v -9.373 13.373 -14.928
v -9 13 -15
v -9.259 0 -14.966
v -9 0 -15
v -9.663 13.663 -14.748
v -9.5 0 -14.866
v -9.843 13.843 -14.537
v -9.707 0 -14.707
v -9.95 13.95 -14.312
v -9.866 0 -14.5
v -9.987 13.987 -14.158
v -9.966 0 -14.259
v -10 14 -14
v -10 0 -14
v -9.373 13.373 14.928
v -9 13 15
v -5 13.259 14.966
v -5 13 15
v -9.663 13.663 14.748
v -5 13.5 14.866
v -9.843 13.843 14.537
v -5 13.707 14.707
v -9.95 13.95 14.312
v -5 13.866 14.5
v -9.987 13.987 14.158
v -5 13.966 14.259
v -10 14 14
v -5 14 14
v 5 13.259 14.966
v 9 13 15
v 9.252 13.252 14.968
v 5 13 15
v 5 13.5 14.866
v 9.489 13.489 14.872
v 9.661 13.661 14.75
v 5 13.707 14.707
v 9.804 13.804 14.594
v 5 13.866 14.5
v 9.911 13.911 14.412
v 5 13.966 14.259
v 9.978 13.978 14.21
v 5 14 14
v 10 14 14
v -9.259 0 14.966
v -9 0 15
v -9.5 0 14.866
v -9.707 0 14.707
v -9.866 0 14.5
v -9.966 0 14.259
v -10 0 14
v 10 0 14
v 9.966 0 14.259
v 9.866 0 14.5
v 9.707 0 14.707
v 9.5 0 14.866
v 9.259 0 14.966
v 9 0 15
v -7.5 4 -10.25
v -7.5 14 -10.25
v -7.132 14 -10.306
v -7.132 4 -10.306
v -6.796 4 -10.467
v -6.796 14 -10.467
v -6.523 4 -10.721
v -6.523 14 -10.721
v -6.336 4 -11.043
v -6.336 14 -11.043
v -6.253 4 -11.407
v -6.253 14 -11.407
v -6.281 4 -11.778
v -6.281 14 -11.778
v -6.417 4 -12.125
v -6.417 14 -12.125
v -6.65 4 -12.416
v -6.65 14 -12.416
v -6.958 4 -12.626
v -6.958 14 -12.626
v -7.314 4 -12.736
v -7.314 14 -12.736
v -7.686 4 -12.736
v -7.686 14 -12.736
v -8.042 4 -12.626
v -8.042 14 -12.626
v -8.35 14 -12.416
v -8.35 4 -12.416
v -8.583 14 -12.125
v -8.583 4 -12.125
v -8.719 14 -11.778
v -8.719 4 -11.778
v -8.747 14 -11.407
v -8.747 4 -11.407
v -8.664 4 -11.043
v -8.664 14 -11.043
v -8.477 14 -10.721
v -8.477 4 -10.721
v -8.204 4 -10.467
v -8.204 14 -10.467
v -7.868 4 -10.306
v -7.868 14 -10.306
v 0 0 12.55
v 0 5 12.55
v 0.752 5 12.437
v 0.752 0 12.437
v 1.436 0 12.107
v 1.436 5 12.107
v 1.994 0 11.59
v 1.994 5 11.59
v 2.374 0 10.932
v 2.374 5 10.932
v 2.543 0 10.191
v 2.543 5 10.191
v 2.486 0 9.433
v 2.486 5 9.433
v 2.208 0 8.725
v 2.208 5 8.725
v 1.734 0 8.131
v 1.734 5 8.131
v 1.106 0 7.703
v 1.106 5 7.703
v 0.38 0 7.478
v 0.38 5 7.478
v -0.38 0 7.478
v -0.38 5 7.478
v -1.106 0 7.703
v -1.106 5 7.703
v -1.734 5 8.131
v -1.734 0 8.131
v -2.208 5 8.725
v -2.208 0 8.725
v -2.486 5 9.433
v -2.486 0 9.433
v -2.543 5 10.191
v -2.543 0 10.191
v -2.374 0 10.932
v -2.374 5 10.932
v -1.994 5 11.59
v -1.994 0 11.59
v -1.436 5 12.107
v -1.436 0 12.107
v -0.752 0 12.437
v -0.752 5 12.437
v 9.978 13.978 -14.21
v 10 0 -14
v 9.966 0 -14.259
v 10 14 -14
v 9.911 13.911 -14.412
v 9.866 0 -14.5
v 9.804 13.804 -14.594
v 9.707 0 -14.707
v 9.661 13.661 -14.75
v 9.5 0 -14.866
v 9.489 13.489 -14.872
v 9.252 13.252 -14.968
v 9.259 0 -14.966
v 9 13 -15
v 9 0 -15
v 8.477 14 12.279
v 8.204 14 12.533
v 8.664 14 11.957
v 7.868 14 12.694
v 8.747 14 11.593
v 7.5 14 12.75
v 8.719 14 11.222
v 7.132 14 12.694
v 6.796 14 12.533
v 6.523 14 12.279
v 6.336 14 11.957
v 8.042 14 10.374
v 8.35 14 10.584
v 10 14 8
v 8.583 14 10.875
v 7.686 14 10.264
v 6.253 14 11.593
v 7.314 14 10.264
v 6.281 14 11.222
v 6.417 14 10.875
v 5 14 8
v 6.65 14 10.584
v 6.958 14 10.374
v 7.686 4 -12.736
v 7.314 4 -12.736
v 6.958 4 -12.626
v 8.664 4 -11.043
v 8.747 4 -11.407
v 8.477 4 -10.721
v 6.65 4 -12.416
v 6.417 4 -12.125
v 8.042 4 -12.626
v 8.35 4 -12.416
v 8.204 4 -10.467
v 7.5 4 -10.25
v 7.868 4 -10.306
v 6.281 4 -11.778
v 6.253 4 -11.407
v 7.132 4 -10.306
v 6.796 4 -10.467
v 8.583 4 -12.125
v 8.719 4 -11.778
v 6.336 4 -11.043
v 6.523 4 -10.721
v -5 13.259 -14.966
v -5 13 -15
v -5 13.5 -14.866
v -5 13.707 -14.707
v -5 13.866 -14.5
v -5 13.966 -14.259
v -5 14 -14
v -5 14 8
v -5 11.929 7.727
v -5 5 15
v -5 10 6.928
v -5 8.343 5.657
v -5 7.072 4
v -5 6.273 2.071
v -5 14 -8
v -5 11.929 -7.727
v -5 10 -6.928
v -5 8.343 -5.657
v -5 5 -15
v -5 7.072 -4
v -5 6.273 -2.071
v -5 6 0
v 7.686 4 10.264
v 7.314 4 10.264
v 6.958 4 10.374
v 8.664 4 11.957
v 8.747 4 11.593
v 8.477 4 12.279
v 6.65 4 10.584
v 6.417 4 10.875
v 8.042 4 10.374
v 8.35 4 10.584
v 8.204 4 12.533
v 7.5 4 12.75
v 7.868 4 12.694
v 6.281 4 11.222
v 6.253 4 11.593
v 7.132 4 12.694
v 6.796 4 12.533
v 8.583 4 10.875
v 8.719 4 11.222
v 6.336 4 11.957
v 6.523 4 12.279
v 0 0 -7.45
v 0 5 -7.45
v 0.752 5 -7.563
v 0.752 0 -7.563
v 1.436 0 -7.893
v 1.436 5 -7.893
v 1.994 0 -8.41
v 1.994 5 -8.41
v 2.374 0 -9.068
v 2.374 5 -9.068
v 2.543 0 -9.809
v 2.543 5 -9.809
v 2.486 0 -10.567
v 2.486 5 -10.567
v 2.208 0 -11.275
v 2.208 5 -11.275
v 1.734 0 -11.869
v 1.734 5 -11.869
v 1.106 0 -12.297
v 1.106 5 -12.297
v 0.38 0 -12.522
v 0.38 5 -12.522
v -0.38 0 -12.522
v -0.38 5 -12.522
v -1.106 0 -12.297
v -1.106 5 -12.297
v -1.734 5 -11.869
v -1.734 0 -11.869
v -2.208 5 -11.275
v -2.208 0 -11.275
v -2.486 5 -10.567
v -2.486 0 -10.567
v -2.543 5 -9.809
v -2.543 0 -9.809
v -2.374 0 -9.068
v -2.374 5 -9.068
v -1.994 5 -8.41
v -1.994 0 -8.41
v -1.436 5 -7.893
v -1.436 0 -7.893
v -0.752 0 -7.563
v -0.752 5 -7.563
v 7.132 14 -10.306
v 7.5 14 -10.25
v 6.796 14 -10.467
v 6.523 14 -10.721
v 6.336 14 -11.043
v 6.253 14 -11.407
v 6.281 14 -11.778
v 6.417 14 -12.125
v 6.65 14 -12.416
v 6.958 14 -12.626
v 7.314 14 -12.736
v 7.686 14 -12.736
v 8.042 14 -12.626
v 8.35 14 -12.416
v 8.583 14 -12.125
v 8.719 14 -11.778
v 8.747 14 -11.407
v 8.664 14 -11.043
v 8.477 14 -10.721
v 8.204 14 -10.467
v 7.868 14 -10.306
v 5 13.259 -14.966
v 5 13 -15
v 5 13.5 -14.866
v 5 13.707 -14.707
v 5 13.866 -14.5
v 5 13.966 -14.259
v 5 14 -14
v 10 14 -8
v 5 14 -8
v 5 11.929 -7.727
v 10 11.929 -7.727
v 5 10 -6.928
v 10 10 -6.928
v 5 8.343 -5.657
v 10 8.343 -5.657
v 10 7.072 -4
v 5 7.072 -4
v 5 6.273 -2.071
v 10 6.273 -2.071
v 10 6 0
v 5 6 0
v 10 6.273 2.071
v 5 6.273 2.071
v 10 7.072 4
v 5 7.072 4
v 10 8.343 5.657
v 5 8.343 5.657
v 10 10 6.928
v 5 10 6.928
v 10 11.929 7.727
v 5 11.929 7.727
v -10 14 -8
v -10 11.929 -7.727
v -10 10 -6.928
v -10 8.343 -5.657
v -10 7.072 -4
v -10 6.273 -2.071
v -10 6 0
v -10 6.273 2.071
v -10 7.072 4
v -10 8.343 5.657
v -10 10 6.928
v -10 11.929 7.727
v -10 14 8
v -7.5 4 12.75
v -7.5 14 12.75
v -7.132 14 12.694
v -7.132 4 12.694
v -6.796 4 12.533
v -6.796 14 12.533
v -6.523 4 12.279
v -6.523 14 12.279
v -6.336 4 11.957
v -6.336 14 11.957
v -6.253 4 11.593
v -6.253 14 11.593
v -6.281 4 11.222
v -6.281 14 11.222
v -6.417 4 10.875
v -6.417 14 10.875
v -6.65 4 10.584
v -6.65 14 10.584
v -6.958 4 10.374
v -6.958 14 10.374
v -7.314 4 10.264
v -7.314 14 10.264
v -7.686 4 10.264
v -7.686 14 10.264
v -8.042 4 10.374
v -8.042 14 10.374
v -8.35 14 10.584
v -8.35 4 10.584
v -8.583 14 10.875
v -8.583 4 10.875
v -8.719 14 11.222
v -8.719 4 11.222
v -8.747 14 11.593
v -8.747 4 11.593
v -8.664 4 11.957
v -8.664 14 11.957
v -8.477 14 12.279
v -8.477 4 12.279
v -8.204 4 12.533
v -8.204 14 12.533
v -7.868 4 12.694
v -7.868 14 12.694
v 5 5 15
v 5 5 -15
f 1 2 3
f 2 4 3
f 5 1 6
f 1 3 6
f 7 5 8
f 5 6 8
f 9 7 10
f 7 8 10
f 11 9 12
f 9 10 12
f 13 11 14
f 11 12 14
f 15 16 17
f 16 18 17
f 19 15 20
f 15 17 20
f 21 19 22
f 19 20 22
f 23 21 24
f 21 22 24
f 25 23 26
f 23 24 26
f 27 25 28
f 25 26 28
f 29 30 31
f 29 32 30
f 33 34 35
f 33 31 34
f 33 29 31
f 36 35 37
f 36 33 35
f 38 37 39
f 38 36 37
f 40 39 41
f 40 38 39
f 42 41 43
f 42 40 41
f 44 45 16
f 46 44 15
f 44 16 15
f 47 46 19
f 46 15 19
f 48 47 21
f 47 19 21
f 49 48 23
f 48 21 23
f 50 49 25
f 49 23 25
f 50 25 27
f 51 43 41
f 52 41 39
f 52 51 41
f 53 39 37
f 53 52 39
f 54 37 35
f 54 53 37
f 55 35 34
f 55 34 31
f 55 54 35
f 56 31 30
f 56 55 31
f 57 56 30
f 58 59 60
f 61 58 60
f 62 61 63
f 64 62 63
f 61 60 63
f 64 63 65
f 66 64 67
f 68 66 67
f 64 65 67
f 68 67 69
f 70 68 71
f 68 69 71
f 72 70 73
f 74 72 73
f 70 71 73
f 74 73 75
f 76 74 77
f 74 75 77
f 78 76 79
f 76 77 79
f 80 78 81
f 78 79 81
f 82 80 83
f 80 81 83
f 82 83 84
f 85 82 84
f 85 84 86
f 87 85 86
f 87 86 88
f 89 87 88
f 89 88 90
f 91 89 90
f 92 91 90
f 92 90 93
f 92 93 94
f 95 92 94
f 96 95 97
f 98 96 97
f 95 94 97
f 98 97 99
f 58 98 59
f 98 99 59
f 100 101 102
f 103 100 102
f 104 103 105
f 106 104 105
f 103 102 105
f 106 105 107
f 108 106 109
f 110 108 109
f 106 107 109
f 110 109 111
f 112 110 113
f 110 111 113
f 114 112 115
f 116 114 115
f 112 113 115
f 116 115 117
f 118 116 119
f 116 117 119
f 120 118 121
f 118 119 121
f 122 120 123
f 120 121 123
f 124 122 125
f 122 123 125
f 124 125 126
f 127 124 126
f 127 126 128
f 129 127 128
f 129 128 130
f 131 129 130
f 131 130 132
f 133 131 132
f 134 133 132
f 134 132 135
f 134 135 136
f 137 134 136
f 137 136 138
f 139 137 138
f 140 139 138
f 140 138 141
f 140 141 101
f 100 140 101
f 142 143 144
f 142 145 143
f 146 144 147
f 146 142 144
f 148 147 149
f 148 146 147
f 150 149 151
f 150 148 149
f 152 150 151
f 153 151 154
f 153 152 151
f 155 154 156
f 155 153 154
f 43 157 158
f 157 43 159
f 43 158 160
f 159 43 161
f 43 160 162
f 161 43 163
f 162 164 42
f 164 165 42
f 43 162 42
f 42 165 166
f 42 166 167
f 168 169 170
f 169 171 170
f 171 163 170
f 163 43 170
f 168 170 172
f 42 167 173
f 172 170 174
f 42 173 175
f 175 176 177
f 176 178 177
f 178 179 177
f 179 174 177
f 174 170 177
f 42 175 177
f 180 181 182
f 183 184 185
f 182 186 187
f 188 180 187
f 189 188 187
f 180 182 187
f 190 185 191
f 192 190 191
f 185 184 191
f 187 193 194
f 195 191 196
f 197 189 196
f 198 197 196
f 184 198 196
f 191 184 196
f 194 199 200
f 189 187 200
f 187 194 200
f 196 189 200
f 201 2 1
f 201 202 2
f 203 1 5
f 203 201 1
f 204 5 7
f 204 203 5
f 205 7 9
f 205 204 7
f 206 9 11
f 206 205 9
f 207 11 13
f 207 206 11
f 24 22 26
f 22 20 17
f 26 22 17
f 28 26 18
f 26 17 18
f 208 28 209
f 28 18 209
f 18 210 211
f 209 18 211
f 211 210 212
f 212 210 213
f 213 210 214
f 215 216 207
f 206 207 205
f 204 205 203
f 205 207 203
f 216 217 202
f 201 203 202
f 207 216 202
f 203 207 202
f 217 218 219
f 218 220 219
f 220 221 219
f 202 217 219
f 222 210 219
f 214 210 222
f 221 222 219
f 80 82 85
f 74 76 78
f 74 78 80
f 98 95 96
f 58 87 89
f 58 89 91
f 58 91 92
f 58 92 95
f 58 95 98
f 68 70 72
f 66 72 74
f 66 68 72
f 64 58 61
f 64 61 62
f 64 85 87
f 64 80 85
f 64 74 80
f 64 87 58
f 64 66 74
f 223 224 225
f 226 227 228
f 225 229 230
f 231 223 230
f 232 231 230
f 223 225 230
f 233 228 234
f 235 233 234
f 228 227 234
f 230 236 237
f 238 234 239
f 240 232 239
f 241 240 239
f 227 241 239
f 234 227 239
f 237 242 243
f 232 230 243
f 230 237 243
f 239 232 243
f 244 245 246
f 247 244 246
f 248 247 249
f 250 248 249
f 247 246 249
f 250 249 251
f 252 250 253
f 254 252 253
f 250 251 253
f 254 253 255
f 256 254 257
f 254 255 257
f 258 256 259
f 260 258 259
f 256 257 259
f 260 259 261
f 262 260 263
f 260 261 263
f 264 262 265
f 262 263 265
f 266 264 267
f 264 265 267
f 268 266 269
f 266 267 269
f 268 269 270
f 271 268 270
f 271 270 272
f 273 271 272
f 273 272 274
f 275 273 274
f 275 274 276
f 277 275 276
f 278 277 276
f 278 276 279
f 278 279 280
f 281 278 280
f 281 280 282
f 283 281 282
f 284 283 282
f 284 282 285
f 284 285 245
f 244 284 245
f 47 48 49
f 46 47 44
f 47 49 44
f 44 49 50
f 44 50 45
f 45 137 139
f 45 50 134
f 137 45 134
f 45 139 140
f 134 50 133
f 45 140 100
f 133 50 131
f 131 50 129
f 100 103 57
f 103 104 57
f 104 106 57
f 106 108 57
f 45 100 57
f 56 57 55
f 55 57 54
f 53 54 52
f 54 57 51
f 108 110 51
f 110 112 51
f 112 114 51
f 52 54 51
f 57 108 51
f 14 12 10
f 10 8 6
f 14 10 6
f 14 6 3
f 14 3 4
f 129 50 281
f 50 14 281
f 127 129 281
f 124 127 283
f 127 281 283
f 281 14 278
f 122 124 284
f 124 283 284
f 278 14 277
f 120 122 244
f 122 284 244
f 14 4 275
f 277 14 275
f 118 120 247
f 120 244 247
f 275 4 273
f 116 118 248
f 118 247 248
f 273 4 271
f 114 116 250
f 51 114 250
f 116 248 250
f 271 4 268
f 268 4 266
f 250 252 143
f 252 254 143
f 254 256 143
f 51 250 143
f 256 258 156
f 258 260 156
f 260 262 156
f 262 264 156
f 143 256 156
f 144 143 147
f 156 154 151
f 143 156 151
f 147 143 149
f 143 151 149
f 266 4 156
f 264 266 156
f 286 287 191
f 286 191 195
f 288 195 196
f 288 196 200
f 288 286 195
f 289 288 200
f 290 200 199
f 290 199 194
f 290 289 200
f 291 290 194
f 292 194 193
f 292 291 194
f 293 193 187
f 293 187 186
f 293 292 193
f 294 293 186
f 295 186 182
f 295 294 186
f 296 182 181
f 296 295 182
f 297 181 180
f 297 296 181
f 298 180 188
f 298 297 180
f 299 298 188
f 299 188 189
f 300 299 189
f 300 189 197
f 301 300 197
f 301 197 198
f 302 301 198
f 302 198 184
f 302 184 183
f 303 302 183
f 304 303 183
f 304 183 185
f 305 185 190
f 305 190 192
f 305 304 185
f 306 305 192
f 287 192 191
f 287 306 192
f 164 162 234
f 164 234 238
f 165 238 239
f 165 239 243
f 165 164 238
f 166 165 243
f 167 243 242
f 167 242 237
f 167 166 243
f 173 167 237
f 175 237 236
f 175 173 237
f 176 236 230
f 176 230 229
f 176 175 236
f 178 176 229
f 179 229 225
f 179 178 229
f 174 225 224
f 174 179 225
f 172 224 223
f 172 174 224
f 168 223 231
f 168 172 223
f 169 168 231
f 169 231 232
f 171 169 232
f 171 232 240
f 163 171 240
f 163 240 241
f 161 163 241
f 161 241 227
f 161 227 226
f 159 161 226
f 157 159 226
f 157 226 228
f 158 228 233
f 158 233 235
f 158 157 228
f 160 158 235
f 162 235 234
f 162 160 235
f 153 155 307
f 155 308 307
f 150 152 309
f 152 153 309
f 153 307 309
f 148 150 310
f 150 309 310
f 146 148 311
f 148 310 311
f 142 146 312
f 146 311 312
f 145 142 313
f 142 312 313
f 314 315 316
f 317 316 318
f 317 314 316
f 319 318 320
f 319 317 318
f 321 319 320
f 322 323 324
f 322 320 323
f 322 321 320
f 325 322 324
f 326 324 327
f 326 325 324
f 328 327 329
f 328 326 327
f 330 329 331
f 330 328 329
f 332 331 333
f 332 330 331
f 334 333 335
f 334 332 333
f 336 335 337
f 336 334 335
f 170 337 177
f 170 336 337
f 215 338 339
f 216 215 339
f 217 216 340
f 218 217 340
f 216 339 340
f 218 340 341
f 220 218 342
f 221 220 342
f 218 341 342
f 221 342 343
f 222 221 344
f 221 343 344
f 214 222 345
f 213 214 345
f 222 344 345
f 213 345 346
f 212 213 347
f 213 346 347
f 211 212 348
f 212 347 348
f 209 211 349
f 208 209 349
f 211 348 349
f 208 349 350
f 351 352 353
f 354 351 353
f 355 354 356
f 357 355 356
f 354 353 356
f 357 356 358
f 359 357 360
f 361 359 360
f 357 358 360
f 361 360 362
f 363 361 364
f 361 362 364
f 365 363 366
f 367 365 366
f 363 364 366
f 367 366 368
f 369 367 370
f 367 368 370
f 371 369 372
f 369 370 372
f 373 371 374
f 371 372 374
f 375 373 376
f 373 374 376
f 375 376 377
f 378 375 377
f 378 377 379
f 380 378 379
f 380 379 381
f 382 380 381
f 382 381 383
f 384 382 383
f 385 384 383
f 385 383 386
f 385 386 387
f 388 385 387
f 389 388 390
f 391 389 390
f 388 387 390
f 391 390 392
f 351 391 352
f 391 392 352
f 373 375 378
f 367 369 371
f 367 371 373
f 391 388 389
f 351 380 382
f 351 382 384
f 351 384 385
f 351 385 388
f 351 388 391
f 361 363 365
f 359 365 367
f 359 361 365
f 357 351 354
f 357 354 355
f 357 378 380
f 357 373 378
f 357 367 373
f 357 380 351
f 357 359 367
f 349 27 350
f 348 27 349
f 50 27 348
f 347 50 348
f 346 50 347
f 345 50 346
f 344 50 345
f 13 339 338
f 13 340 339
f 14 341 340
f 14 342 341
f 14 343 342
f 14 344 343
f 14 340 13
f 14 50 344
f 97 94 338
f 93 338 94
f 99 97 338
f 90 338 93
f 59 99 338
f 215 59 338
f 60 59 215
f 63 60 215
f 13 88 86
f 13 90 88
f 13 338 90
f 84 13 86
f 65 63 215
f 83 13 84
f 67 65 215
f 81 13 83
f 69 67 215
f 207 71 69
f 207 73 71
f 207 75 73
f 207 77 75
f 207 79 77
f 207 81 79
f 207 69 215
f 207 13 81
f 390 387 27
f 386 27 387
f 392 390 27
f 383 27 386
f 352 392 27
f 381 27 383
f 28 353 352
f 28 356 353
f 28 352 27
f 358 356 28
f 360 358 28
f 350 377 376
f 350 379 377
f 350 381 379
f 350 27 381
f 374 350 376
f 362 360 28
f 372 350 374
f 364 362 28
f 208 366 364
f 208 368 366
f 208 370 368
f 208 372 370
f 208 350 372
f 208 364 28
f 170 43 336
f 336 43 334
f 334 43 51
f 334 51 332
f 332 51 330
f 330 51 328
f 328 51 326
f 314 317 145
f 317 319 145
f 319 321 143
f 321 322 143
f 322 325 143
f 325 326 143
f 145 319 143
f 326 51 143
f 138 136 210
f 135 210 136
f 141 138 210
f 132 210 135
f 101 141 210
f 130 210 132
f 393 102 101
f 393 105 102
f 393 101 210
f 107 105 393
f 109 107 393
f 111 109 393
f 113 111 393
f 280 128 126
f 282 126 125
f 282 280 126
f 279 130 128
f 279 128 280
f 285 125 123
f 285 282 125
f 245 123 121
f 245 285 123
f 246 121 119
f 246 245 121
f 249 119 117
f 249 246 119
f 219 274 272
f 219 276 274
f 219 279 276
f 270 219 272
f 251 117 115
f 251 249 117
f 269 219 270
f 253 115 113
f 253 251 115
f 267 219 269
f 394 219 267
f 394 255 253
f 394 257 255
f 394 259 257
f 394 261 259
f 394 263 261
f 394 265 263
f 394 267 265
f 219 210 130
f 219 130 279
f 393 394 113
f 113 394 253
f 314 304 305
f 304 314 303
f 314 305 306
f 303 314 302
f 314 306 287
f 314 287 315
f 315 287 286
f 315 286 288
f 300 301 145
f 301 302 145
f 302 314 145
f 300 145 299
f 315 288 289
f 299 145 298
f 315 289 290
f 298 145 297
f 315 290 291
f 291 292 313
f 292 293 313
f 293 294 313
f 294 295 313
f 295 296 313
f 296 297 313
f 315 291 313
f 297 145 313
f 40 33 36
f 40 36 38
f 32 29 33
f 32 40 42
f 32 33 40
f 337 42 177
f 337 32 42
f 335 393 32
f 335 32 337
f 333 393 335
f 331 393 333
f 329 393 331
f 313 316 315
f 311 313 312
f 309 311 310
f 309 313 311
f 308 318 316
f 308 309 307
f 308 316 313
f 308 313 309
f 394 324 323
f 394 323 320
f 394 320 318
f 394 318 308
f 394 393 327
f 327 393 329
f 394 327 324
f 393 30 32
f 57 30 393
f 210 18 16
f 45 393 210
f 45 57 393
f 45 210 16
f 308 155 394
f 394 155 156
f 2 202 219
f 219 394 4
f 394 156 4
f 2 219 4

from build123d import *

# Parameters (mm, degrees)
SKETCH1_W           = 20
SKETCH1_H           = 30
BOSS_EXTRUDE1_DEPTH = 5
SKETCH2_R           = 2.55
CUT_EXTRUDE1_DEPTH  = 19.708286934
SKETCH3_W           = 5
SKETCH3_H           = 30
BOSS_EXTRUDE2_DEPTH = 9
SKETCH4_R           = 8
CUT_EXTRUDE2_DEPTH  = 29.653097564
SKETCH5_R           = 1.25
CUT_EXTRUDE3_DEPTH  = 10
FILLET1_R           = 1


with BuildPart() as part:
    # Sketch1 → Boss-Extrude1 (new body)
    with BuildSketch(Plane(origin=(0, 0, 0), x_dir=(1, 0, 0), z_dir=(0, 1, 0))):
        Rectangle(SKETCH1_W, SKETCH1_H)
    extrude(amount=BOSS_EXTRUDE1_DEPTH)

    # Sketch2 → Cut-Extrude1 (cut, through all)
    with BuildSketch(Plane(origin=(0, 5, 0), x_dir=(1, 0, 0), z_dir=(0, 1, 0))):
        with Locations(Location((0, 10, 0), (0, 0, 270))):
            Circle(SKETCH2_R)
        with Locations(Location((0, -10, 0), (0, 0, 270))):
            Circle(SKETCH2_R)
    extrude(amount=-CUT_EXTRUDE1_DEPTH, mode=Mode.SUBTRACT)

    # Sketch3 → Boss-Extrude2 (add)
    with BuildSketch(Plane(origin=(0, 5, 0), x_dir=(1, 0, 0), z_dir=(0, 1, 0))):
        with Locations((-7.5, 0)):
            Rectangle(SKETCH3_W, SKETCH3_H)
    boss_extrude2 = extrude(amount=BOSS_EXTRUDE2_DEPTH)

    # Sketch4 → Cut-Extrude2 (cut, through all)
    with BuildSketch(Plane.ZY.offset(10)):
        with Locations((0, 14)):
            Circle(SKETCH4_R)
    cut_extrude2 = extrude(amount=-CUT_EXTRUDE2_DEPTH, mode=Mode.SUBTRACT)

    # Sketch5 → Cut-Extrude3 (cut)
    with BuildSketch(Plane(origin=(0, 14, 0), x_dir=(1, 0, 0), z_dir=(0, 1, 0))):
        with Locations(Location((-7.5, 11.5, 0), (0, 0, 270))):
            Circle(SKETCH5_R)
        with Locations(Location((-7.5, -11.5, 0), (0, 0, 270))):
            Circle(SKETCH5_R)
    cut_extrude3 = extrude(amount=-CUT_EXTRUDE3_DEPTH, mode=Mode.SUBTRACT)

    # Mirror1: Boss-Extrude2, Cut-Extrude2, Cut-Extrude3 across plane
    add(boss_extrude2.mirror(Plane(origin=(0, 0, 0), x_dir=(0, 0, 1), z_dir=(1, 0, 0))))
    add(cut_extrude2.mirror(Plane(origin=(0, 0, 0), x_dir=(0, 0, 1), z_dir=(1, 0, 0))), mode=Mode.SUBTRACT)
    add(cut_extrude3.mirror(Plane(origin=(0, 0, 0), x_dir=(0, 0, 1), z_dir=(1, 0, 0))), mode=Mode.SUBTRACT)

    # Fillet1
    fillet1_edges = [part.edges().sort_by_distance(p)[0] for p in [
        (-10, 7, -15),
        (10, 7, -15),
        (10, 7, 15),
        (-10, 7, 15),
        (-7.5, 14, -15),
        (7.5, 14, -15),
        (7.5, 14, 15),
        (-7.5, 14, 15),
    ]]
    fillet(fillet1_edges, radius=FILLET1_R)


solid = part.part
